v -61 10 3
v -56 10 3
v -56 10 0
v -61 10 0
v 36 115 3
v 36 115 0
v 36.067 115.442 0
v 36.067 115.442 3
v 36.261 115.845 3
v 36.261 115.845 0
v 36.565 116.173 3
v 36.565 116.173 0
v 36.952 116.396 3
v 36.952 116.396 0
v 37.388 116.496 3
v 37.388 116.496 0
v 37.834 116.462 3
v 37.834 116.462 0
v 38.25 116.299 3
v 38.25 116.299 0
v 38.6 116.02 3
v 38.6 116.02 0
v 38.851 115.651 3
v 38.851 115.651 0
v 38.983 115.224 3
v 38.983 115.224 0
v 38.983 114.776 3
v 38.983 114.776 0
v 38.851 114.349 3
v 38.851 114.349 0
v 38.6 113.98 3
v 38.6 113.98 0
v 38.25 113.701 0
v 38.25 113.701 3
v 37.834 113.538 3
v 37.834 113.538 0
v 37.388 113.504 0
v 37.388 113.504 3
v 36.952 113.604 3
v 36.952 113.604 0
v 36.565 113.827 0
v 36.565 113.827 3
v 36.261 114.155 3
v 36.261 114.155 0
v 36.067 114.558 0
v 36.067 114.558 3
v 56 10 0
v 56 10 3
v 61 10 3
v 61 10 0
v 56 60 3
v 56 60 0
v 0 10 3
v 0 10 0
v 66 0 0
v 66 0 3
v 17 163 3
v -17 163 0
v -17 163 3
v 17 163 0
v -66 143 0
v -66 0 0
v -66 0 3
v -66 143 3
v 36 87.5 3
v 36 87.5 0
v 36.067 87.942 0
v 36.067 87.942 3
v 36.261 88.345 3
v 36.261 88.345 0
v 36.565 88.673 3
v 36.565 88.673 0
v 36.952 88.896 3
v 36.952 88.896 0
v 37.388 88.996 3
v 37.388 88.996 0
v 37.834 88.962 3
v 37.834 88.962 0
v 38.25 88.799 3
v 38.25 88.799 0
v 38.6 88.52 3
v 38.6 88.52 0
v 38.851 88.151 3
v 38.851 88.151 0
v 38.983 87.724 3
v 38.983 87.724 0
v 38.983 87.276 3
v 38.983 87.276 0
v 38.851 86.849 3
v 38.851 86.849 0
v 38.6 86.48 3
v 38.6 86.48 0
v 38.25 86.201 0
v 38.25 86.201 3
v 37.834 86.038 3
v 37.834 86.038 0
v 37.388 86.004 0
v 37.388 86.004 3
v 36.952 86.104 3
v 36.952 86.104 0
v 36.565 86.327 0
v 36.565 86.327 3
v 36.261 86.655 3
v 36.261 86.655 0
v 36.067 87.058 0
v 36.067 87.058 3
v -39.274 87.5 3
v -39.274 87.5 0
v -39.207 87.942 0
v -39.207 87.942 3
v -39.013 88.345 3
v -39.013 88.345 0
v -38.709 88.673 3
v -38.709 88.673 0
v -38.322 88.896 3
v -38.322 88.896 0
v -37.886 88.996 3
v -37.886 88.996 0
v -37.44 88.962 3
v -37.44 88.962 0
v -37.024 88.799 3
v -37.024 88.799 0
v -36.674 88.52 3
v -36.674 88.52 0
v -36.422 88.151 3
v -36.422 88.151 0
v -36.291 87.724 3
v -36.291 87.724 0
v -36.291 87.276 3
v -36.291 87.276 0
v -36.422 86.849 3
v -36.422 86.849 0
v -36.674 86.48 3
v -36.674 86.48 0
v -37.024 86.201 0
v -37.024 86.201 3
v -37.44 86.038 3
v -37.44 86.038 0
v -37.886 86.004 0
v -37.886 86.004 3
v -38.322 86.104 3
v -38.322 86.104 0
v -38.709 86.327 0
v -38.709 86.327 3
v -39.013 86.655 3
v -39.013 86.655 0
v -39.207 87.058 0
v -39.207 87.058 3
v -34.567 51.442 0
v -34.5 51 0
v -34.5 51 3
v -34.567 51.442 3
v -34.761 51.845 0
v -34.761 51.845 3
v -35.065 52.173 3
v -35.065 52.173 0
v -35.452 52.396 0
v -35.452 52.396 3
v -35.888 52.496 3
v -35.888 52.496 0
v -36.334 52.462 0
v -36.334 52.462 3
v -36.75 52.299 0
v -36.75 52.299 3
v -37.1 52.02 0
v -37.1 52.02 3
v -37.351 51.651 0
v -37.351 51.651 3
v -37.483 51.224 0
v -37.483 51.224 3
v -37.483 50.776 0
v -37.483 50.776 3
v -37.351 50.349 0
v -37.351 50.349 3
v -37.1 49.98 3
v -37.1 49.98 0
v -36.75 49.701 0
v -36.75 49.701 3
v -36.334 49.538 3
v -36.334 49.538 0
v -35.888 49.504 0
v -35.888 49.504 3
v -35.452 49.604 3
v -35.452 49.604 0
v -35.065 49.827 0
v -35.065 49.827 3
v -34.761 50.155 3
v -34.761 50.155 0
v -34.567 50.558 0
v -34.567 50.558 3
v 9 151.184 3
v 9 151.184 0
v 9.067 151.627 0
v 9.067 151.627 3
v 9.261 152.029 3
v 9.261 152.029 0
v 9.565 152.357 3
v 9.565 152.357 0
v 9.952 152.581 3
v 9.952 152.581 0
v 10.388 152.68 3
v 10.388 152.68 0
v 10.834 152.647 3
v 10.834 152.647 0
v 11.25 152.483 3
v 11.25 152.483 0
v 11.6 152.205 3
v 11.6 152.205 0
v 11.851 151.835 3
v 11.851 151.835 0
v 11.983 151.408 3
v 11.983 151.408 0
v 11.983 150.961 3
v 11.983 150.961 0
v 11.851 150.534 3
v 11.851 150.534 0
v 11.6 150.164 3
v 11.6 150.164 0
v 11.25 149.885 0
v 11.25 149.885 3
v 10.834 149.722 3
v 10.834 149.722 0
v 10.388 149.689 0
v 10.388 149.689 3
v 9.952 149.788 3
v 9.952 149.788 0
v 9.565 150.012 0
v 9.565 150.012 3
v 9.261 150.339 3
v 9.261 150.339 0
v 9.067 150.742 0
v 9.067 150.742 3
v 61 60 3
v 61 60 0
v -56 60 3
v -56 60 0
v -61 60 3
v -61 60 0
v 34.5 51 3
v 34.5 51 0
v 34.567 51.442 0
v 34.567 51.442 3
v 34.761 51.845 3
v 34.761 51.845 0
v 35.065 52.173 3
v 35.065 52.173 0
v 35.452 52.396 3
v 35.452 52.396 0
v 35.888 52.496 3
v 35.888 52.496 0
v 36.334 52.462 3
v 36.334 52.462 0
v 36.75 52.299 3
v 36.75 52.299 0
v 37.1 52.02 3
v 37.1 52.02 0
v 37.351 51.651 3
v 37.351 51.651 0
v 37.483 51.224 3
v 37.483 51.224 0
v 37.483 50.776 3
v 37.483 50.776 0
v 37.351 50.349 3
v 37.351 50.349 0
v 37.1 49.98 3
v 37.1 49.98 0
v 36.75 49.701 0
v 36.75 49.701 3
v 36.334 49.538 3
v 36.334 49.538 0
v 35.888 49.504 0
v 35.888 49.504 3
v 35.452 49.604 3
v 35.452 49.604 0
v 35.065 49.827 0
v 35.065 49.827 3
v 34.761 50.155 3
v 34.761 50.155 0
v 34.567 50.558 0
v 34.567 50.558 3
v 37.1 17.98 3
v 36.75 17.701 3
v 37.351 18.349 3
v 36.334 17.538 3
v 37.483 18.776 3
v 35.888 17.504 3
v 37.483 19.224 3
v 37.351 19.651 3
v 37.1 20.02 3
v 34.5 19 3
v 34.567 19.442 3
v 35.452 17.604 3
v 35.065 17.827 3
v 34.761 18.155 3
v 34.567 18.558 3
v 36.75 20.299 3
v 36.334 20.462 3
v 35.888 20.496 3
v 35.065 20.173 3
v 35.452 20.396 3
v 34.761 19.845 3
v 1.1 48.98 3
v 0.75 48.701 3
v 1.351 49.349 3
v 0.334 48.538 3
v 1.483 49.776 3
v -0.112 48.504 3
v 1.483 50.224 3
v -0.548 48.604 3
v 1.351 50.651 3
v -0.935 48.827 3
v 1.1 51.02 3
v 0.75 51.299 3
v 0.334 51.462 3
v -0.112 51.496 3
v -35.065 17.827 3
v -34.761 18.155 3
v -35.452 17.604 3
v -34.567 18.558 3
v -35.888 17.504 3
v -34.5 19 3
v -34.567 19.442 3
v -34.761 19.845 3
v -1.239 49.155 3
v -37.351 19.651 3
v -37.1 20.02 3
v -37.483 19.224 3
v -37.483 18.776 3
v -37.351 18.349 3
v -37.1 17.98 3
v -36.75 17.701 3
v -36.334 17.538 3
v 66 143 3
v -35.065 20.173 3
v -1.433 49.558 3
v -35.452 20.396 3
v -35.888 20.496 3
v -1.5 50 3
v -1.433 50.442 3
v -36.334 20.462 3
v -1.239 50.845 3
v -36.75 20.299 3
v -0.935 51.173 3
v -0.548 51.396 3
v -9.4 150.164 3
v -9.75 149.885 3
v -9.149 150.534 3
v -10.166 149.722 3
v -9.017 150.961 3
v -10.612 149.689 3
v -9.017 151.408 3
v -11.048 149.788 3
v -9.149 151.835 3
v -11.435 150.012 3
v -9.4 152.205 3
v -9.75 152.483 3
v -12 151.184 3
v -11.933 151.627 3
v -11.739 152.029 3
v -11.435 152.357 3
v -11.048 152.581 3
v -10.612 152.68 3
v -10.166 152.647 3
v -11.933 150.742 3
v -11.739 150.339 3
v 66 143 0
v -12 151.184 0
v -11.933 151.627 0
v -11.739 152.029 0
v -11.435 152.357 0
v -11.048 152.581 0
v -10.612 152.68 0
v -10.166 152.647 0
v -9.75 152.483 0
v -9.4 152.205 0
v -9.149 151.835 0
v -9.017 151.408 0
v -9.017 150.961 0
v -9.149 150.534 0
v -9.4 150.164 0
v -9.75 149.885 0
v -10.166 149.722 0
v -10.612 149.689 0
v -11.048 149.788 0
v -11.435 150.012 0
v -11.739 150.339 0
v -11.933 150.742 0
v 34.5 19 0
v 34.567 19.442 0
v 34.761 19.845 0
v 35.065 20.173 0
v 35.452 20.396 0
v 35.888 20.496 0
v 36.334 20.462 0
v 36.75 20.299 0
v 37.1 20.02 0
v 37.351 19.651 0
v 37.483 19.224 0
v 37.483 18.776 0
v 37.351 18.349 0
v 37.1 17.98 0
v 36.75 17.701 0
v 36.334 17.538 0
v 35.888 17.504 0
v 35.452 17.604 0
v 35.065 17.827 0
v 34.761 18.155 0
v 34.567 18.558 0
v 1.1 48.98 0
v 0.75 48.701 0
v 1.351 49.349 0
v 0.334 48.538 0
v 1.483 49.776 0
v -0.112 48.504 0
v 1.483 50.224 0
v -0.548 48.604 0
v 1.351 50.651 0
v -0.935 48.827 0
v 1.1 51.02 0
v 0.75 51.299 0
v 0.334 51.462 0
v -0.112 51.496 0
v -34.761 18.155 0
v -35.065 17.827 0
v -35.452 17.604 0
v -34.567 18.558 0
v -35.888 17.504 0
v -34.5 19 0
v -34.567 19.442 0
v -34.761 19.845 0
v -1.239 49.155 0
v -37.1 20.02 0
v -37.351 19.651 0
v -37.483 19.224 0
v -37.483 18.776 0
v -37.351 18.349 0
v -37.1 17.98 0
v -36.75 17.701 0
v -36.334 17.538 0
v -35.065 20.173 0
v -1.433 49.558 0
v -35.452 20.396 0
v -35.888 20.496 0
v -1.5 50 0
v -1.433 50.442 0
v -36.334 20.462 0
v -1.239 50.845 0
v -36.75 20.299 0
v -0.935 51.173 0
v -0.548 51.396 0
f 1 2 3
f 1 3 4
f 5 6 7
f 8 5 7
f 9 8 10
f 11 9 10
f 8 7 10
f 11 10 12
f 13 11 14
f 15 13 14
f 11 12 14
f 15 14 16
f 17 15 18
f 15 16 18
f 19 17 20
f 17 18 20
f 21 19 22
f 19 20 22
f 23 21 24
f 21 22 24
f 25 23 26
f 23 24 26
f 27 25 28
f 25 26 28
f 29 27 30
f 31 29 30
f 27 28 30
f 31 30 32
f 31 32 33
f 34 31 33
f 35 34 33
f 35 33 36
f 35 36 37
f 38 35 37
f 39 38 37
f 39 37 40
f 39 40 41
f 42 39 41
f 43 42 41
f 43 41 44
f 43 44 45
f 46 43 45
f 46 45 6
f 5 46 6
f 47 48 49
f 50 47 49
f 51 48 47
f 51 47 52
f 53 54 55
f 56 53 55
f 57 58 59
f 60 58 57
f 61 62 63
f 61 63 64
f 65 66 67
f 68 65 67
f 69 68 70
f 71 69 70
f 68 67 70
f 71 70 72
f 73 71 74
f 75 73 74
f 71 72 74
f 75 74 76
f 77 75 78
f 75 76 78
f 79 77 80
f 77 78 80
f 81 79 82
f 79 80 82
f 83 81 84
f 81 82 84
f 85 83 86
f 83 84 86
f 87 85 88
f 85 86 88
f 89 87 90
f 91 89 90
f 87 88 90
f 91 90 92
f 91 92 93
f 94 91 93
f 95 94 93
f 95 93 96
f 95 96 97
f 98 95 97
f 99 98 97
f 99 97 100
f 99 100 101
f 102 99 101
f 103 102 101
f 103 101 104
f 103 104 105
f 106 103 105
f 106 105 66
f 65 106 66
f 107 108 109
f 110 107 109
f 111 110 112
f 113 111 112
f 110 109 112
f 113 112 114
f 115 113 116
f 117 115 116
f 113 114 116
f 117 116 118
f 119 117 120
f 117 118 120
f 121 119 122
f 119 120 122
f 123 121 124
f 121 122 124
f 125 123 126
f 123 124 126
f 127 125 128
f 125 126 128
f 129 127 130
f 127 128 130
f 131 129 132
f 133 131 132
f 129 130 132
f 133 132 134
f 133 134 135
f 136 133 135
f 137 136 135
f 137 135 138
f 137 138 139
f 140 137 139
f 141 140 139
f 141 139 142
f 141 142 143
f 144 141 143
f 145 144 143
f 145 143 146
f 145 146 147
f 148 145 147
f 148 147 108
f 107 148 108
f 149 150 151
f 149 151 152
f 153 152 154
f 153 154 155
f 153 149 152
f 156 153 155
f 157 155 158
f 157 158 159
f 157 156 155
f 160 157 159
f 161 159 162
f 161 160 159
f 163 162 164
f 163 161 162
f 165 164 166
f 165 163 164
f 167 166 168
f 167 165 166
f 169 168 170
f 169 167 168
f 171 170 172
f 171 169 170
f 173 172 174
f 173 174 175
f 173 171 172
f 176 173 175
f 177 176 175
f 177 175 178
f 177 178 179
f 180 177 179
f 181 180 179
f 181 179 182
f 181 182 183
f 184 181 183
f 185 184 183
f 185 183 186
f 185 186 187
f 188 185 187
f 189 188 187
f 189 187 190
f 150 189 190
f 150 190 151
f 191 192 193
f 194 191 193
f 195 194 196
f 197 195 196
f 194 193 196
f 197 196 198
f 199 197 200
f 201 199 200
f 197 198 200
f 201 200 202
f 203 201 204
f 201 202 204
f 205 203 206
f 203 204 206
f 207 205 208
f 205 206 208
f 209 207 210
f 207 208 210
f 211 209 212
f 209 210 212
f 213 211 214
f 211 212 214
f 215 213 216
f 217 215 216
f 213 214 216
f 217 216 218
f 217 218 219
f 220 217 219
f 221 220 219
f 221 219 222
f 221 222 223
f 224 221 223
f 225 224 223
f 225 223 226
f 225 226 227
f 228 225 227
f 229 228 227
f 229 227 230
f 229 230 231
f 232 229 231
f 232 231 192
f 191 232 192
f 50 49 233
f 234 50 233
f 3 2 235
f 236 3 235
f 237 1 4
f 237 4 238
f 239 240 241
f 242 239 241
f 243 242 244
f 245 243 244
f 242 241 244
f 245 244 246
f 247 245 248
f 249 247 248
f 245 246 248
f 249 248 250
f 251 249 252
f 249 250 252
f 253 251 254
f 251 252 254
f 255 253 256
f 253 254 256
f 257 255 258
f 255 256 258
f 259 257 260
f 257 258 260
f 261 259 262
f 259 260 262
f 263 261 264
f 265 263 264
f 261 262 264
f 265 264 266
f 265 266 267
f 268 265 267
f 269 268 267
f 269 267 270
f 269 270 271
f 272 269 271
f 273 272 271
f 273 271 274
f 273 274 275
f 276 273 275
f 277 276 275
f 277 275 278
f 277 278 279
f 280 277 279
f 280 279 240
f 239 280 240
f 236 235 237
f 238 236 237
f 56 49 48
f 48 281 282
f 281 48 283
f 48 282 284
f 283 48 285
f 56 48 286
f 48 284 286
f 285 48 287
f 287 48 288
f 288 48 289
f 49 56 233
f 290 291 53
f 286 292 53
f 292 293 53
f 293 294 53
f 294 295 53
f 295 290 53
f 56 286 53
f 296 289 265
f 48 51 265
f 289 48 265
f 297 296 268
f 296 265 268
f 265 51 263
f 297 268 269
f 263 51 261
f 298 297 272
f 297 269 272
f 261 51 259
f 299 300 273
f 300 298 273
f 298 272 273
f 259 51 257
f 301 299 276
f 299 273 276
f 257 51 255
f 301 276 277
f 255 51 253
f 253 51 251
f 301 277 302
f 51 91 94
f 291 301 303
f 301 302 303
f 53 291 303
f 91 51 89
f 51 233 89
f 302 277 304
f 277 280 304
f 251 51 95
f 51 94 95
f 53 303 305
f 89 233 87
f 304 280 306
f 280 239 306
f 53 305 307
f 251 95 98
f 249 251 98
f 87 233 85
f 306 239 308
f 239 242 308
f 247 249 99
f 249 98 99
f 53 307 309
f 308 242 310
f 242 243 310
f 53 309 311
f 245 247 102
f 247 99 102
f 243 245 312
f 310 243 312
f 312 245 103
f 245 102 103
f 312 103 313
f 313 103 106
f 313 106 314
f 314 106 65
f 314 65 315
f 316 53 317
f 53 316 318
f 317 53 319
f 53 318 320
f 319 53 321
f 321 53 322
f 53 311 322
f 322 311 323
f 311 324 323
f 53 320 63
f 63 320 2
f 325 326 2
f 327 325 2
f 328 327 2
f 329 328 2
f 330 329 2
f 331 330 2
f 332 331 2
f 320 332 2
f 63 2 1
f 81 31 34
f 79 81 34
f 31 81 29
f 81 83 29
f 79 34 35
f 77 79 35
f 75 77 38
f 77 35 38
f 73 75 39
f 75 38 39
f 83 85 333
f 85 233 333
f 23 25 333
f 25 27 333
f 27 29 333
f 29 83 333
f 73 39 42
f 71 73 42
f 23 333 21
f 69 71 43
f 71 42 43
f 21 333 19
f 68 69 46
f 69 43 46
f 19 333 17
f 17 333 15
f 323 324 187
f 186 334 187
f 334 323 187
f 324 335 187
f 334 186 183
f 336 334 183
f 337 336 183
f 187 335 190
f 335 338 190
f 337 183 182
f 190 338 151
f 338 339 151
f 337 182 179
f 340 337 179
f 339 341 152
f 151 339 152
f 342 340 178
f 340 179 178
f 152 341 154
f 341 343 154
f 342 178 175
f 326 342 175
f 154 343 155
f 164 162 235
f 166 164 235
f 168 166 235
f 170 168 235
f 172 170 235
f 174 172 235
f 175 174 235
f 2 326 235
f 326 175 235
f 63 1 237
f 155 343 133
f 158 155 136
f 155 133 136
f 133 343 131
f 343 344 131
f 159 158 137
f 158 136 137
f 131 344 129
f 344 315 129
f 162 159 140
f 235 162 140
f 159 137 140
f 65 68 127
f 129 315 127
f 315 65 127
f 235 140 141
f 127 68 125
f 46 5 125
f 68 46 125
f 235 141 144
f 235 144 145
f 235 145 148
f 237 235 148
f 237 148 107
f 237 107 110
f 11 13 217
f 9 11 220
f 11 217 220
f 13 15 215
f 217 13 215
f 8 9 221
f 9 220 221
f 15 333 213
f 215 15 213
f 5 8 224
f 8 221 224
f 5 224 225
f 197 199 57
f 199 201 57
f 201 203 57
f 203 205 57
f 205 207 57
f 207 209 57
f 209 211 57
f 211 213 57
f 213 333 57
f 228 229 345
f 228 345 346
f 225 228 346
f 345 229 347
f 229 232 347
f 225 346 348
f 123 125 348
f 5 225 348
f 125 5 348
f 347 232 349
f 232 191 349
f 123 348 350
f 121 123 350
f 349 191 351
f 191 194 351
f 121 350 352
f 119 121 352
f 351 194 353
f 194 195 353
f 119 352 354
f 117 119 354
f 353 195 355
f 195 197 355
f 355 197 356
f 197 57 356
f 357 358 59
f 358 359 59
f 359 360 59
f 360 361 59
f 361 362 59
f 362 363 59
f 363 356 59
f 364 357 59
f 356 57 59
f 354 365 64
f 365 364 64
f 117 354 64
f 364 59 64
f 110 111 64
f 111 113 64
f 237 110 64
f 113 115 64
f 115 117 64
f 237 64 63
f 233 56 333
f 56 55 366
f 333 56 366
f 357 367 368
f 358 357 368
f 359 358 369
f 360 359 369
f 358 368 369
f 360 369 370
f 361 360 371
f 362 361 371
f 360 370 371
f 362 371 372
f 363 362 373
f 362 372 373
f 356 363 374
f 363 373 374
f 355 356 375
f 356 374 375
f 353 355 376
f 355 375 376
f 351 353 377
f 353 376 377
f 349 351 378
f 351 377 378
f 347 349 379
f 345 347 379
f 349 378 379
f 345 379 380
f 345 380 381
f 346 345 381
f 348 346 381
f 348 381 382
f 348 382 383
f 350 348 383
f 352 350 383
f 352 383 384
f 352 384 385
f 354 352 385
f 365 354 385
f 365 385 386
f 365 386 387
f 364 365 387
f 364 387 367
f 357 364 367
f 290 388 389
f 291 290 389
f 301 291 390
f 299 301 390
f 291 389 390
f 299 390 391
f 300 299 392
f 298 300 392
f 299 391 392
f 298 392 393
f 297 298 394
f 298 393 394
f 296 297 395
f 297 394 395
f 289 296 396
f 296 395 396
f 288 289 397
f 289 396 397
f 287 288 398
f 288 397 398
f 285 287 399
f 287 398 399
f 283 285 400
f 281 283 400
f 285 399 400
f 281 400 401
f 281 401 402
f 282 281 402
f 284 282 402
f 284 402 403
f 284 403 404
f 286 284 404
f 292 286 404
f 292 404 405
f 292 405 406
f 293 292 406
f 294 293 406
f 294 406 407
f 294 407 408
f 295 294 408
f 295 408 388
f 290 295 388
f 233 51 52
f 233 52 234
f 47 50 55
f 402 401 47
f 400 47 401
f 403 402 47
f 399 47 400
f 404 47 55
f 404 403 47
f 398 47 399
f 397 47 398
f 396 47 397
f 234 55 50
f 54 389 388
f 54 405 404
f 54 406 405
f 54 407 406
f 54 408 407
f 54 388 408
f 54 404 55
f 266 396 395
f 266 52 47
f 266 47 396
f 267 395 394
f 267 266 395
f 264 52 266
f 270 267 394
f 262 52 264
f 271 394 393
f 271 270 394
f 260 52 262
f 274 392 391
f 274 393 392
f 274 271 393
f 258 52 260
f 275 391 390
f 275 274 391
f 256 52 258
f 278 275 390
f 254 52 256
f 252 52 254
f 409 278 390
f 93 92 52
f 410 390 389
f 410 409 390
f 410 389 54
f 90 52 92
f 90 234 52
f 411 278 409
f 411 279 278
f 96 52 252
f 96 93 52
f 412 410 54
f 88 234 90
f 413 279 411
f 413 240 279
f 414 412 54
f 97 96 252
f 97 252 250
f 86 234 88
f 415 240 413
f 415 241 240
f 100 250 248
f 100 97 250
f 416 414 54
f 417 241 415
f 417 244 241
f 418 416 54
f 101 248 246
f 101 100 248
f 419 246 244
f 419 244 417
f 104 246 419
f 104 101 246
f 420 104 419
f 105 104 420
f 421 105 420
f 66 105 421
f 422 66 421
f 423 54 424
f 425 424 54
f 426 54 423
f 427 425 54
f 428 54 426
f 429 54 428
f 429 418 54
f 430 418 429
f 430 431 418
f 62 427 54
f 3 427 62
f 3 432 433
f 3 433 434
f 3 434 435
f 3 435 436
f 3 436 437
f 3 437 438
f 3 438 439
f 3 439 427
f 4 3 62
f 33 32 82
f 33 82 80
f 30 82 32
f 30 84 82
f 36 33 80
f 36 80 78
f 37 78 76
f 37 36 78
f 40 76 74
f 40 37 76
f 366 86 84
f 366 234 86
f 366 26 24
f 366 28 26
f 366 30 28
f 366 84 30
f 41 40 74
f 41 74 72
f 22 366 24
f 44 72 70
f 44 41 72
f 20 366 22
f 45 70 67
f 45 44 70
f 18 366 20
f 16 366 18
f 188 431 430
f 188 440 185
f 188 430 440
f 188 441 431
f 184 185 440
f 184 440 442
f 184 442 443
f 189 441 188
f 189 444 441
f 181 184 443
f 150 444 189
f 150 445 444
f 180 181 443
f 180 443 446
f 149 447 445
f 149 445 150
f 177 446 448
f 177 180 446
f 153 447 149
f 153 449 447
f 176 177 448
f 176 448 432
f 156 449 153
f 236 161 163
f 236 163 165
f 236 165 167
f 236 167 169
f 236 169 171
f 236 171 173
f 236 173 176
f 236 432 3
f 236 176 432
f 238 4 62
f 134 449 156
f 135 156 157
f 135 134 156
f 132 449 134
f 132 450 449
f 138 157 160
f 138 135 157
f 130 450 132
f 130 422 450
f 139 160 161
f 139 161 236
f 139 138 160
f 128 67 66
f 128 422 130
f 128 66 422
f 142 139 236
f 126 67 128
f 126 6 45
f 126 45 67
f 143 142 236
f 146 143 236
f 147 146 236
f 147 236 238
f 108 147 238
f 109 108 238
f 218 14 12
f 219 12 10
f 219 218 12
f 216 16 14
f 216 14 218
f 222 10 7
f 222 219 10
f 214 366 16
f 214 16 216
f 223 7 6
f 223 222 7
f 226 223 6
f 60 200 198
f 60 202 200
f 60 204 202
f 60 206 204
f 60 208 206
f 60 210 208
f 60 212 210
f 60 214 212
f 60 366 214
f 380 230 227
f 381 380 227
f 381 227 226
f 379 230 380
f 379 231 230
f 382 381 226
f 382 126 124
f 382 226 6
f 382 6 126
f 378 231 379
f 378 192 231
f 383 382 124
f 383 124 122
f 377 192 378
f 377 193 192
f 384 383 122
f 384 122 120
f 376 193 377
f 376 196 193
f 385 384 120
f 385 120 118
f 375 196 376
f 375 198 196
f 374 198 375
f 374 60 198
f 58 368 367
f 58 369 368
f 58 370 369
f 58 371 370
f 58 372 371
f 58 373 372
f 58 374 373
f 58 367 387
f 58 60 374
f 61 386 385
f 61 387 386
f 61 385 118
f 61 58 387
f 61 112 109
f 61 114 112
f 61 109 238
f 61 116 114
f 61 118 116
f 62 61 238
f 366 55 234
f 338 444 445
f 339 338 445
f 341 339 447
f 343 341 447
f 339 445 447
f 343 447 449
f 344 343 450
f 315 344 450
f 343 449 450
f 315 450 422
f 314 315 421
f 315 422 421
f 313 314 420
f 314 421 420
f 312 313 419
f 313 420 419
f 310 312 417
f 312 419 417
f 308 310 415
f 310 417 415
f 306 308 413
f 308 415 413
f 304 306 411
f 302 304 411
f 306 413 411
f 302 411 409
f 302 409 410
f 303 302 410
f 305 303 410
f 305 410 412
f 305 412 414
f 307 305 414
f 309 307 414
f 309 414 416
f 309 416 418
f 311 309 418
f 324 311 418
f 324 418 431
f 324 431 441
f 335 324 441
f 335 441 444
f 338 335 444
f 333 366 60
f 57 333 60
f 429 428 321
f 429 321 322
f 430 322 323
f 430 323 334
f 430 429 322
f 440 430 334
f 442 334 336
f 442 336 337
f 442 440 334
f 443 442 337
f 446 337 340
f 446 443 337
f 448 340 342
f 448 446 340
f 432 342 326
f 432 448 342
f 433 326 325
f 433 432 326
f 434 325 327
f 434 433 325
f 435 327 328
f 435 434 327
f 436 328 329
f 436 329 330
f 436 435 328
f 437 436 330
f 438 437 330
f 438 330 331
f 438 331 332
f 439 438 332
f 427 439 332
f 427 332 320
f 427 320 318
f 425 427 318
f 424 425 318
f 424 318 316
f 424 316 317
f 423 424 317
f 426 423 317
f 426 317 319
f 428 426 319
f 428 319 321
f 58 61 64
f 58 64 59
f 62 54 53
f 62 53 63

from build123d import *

# Parameters (mm, degrees)
F1_DEPTH = 3
F2_W     = 5
F2_H     = 50
F3_DEPTH = 3
F5_D     = 3
F8_D     = 3
F10_D    = 3
F12_D    = 3
F14_D    = 3


with BuildPart() as f1:
    # F0 (on Top) → F1 (new body)
    with BuildSketch(Plane.XY):
        Polygon((0, 10), (66, 0), (66, 143), (17, 163), (0, 163), align=None)
    extrude(amount=F1_DEPTH)

    # F2 (on face) → F3 (cut)
    with BuildSketch(Plane.XY.offset(3)):
        with Locations((58.5, 35)):
            Rectangle(F2_W, F2_H)
    extrude(amount=-F3_DEPTH, mode=Mode.SUBTRACT)

    # F5 (through all)
    with Locations(Plane.XY.offset(3)):
        with Locations((36, 19), (36, 51)):
            Hole(F5_D / 2)

    # F6: F1 across plane


with BuildPart() as f1_1:
    add(f1.part)
    add(f1.part.mirror(Plane.YZ))

    # F8 (through all)
    with Locations(Plane.XY.offset(3)):
        with Locations((0, 50)):
            Hole(F8_D / 2)

    # F10 (through all)
    with Locations(Plane.XY.offset(3)):
        with Locations((-37.773754, 87.5), (37.5, 87.5)):
            Hole(F10_D / 2)

    # F12 (through all)
    with Locations(Plane.XY.offset(3)):
        with Locations((37.5, 115)):
            Hole(F12_D / 2)

    # F14 (through all)
    with Locations(Plane.XY.offset(3)):
        with Locations((-10.5, 151.18438), (10.5, 151.18438)):
            Hole(F14_D / 2)


solid = f1_1.part
